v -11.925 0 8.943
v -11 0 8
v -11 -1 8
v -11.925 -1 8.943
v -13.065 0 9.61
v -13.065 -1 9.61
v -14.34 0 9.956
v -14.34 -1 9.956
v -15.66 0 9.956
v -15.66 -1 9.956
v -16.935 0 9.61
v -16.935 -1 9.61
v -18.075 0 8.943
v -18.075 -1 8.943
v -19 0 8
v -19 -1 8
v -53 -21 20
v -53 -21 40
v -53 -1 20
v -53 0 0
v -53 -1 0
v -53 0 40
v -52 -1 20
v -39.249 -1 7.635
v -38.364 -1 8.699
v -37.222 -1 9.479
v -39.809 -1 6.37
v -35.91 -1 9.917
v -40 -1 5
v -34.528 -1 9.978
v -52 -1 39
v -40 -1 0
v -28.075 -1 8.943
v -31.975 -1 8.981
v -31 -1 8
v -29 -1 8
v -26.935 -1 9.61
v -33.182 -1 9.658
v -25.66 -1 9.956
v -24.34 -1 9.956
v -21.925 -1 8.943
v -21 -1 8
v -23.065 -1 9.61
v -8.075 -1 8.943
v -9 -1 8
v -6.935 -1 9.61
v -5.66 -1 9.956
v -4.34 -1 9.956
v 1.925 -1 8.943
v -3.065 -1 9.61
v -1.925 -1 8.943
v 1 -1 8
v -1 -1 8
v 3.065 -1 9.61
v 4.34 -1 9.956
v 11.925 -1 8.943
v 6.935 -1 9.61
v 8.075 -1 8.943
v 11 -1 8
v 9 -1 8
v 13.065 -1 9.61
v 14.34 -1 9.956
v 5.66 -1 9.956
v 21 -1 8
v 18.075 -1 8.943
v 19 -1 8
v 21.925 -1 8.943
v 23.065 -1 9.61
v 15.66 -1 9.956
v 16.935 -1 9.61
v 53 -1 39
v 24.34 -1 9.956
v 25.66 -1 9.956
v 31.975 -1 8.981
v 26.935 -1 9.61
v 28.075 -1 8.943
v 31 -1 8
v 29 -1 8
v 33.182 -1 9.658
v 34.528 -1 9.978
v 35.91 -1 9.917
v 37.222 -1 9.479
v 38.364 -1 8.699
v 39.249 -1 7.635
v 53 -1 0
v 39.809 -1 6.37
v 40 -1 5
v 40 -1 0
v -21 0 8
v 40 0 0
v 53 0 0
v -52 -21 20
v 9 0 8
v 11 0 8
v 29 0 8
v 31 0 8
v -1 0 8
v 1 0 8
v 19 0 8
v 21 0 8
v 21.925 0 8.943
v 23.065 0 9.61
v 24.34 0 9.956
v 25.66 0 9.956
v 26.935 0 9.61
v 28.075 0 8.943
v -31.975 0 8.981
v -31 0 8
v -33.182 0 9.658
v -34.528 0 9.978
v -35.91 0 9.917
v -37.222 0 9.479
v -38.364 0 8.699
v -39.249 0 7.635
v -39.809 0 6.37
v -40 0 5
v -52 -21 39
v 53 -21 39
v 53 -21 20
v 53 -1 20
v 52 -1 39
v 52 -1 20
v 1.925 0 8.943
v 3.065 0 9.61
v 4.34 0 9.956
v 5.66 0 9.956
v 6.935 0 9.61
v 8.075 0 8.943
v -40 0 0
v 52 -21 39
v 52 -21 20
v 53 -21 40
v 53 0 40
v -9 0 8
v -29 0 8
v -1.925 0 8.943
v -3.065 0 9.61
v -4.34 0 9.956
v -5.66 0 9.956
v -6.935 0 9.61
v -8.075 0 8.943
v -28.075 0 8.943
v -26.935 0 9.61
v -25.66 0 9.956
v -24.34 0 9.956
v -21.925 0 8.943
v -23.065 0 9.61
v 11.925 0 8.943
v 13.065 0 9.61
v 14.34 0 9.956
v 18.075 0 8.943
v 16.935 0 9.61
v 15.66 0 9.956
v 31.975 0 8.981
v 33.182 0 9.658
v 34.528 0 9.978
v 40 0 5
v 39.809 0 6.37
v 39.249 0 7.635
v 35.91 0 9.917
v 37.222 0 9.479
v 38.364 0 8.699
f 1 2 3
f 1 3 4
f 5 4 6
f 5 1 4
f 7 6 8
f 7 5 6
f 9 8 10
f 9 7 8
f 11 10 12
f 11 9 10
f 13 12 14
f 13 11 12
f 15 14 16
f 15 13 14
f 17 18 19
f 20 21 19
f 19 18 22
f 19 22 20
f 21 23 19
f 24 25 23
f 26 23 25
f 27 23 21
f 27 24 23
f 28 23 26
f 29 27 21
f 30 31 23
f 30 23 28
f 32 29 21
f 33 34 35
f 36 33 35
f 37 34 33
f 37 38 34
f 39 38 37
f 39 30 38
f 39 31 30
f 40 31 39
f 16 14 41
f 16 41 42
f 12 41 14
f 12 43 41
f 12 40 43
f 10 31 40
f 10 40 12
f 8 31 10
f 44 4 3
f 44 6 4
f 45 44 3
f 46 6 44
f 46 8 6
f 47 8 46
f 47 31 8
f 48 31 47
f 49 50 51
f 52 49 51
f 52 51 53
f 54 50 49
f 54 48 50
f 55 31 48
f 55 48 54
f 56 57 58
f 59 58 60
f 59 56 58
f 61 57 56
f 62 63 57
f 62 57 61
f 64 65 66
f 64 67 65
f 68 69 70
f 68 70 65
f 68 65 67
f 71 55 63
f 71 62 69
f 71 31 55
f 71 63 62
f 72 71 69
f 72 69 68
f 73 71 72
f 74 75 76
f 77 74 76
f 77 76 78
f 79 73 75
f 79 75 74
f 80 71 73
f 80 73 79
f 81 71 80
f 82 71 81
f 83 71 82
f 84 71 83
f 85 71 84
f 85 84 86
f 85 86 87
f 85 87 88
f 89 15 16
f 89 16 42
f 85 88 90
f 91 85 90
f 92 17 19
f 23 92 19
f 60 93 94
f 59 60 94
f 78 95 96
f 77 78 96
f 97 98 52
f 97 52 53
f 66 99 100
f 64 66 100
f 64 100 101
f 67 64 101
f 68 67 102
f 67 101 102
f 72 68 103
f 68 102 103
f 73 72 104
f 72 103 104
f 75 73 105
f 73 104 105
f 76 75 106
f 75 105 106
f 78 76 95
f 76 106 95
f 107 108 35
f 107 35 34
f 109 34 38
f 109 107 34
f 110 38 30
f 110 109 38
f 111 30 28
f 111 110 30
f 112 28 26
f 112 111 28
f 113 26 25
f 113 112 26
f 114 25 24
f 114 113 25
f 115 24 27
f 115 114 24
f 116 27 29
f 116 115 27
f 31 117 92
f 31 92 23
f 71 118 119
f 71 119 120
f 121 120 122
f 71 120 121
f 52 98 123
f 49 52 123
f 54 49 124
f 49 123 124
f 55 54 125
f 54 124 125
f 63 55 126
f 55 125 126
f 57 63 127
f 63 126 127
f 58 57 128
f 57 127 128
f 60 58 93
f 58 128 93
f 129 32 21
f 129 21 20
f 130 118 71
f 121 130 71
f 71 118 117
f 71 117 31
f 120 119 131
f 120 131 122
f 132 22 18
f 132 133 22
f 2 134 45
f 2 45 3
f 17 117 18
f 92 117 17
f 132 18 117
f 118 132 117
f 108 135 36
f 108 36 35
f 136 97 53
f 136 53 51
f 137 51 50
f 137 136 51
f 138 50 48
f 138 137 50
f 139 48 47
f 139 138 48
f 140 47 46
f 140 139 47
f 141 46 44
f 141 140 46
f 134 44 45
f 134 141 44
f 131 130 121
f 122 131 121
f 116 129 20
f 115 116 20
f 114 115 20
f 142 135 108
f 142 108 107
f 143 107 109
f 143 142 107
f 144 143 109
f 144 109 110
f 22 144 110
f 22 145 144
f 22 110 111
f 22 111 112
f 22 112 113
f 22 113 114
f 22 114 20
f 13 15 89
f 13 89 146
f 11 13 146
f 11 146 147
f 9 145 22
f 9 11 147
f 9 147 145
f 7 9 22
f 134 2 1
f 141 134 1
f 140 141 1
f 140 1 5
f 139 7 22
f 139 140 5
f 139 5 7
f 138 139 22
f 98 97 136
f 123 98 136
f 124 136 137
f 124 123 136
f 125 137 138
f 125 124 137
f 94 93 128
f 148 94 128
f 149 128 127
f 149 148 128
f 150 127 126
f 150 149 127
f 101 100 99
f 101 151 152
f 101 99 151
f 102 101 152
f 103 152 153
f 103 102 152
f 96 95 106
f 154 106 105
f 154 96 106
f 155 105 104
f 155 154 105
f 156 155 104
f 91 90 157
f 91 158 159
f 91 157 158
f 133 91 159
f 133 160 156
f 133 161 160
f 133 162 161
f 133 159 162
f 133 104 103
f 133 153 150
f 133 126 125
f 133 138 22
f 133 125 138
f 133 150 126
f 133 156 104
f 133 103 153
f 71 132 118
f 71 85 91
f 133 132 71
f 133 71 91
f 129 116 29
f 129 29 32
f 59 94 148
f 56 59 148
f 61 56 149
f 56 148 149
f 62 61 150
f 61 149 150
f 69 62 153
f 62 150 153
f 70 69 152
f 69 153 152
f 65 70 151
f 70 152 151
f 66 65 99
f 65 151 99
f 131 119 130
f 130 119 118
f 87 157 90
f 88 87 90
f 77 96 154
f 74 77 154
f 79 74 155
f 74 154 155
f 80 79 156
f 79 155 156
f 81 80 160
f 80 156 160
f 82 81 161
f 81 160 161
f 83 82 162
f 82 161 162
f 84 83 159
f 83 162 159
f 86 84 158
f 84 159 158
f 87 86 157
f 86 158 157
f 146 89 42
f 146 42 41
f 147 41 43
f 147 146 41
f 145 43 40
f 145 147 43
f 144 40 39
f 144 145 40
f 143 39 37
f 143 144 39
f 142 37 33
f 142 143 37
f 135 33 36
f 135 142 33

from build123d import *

# Parameters (mm, degrees)
F1_DEPTH = 53
F2_W     = 20
F2_H     = 19
F3_DEPTH = 1
F5_DEPTH = 1


with BuildPart() as f1:
    # F0 (on Right) → F1 (new body)
    with BuildSketch(Plane.YZ):
        Polygon((0, 40), (-21, 40), (-21, 39), (-1, 39), (-1, 0), (0, 0), align=None)
    extrude(amount=F1_DEPTH)

    # F4 (on face) → F5 (cut, through all)
    with BuildSketch(Plane(origin=(0, 0, 0), x_dir=(-1, 0, 0), z_dir=(0, 1, 0))):
        with BuildLine():
            Line((-40, 5), (-40, 0))
            Line((-40, 0), (0, 0))
            Line((0, 0), (0, 5))
            Line((0, 5), (0, 8))
            Line((0, 8), (-1, 8))
            ThreePointArc((-1, 8), (-5, 10), (-9, 8))
            Line((-9, 8), (-11, 8))
            ThreePointArc((-11, 8), (-15, 10), (-19, 8))
            Line((-19, 8), (-21, 8))
            ThreePointArc((-21, 8), (-25, 10), (-29, 8))
            Line((-29, 8), (-31, 8))
            ThreePointArc((-31, 8), (-36.5811388301, 9.7434164903), (-40, 5))
        make_face()
    extrude(amount=-F5_DEPTH, mode=Mode.SUBTRACT)



with BuildPart() as f3:
    # F2 (on face) → F3 (new body)
    with BuildSketch(Plane.YZ.offset(53)):
        with Locations((-11, 29.5)):
            Rectangle(F2_W, F2_H)
    extrude(amount=-F3_DEPTH)


with BuildPart() as f1_1:
    add(f1.part)
    # F6: F3, F1 across plane
    add(f3.part.mirror(Plane.YZ))
    add(f1.part.mirror(Plane.YZ))


solid = Compound([f3.part, f1_1.part])
